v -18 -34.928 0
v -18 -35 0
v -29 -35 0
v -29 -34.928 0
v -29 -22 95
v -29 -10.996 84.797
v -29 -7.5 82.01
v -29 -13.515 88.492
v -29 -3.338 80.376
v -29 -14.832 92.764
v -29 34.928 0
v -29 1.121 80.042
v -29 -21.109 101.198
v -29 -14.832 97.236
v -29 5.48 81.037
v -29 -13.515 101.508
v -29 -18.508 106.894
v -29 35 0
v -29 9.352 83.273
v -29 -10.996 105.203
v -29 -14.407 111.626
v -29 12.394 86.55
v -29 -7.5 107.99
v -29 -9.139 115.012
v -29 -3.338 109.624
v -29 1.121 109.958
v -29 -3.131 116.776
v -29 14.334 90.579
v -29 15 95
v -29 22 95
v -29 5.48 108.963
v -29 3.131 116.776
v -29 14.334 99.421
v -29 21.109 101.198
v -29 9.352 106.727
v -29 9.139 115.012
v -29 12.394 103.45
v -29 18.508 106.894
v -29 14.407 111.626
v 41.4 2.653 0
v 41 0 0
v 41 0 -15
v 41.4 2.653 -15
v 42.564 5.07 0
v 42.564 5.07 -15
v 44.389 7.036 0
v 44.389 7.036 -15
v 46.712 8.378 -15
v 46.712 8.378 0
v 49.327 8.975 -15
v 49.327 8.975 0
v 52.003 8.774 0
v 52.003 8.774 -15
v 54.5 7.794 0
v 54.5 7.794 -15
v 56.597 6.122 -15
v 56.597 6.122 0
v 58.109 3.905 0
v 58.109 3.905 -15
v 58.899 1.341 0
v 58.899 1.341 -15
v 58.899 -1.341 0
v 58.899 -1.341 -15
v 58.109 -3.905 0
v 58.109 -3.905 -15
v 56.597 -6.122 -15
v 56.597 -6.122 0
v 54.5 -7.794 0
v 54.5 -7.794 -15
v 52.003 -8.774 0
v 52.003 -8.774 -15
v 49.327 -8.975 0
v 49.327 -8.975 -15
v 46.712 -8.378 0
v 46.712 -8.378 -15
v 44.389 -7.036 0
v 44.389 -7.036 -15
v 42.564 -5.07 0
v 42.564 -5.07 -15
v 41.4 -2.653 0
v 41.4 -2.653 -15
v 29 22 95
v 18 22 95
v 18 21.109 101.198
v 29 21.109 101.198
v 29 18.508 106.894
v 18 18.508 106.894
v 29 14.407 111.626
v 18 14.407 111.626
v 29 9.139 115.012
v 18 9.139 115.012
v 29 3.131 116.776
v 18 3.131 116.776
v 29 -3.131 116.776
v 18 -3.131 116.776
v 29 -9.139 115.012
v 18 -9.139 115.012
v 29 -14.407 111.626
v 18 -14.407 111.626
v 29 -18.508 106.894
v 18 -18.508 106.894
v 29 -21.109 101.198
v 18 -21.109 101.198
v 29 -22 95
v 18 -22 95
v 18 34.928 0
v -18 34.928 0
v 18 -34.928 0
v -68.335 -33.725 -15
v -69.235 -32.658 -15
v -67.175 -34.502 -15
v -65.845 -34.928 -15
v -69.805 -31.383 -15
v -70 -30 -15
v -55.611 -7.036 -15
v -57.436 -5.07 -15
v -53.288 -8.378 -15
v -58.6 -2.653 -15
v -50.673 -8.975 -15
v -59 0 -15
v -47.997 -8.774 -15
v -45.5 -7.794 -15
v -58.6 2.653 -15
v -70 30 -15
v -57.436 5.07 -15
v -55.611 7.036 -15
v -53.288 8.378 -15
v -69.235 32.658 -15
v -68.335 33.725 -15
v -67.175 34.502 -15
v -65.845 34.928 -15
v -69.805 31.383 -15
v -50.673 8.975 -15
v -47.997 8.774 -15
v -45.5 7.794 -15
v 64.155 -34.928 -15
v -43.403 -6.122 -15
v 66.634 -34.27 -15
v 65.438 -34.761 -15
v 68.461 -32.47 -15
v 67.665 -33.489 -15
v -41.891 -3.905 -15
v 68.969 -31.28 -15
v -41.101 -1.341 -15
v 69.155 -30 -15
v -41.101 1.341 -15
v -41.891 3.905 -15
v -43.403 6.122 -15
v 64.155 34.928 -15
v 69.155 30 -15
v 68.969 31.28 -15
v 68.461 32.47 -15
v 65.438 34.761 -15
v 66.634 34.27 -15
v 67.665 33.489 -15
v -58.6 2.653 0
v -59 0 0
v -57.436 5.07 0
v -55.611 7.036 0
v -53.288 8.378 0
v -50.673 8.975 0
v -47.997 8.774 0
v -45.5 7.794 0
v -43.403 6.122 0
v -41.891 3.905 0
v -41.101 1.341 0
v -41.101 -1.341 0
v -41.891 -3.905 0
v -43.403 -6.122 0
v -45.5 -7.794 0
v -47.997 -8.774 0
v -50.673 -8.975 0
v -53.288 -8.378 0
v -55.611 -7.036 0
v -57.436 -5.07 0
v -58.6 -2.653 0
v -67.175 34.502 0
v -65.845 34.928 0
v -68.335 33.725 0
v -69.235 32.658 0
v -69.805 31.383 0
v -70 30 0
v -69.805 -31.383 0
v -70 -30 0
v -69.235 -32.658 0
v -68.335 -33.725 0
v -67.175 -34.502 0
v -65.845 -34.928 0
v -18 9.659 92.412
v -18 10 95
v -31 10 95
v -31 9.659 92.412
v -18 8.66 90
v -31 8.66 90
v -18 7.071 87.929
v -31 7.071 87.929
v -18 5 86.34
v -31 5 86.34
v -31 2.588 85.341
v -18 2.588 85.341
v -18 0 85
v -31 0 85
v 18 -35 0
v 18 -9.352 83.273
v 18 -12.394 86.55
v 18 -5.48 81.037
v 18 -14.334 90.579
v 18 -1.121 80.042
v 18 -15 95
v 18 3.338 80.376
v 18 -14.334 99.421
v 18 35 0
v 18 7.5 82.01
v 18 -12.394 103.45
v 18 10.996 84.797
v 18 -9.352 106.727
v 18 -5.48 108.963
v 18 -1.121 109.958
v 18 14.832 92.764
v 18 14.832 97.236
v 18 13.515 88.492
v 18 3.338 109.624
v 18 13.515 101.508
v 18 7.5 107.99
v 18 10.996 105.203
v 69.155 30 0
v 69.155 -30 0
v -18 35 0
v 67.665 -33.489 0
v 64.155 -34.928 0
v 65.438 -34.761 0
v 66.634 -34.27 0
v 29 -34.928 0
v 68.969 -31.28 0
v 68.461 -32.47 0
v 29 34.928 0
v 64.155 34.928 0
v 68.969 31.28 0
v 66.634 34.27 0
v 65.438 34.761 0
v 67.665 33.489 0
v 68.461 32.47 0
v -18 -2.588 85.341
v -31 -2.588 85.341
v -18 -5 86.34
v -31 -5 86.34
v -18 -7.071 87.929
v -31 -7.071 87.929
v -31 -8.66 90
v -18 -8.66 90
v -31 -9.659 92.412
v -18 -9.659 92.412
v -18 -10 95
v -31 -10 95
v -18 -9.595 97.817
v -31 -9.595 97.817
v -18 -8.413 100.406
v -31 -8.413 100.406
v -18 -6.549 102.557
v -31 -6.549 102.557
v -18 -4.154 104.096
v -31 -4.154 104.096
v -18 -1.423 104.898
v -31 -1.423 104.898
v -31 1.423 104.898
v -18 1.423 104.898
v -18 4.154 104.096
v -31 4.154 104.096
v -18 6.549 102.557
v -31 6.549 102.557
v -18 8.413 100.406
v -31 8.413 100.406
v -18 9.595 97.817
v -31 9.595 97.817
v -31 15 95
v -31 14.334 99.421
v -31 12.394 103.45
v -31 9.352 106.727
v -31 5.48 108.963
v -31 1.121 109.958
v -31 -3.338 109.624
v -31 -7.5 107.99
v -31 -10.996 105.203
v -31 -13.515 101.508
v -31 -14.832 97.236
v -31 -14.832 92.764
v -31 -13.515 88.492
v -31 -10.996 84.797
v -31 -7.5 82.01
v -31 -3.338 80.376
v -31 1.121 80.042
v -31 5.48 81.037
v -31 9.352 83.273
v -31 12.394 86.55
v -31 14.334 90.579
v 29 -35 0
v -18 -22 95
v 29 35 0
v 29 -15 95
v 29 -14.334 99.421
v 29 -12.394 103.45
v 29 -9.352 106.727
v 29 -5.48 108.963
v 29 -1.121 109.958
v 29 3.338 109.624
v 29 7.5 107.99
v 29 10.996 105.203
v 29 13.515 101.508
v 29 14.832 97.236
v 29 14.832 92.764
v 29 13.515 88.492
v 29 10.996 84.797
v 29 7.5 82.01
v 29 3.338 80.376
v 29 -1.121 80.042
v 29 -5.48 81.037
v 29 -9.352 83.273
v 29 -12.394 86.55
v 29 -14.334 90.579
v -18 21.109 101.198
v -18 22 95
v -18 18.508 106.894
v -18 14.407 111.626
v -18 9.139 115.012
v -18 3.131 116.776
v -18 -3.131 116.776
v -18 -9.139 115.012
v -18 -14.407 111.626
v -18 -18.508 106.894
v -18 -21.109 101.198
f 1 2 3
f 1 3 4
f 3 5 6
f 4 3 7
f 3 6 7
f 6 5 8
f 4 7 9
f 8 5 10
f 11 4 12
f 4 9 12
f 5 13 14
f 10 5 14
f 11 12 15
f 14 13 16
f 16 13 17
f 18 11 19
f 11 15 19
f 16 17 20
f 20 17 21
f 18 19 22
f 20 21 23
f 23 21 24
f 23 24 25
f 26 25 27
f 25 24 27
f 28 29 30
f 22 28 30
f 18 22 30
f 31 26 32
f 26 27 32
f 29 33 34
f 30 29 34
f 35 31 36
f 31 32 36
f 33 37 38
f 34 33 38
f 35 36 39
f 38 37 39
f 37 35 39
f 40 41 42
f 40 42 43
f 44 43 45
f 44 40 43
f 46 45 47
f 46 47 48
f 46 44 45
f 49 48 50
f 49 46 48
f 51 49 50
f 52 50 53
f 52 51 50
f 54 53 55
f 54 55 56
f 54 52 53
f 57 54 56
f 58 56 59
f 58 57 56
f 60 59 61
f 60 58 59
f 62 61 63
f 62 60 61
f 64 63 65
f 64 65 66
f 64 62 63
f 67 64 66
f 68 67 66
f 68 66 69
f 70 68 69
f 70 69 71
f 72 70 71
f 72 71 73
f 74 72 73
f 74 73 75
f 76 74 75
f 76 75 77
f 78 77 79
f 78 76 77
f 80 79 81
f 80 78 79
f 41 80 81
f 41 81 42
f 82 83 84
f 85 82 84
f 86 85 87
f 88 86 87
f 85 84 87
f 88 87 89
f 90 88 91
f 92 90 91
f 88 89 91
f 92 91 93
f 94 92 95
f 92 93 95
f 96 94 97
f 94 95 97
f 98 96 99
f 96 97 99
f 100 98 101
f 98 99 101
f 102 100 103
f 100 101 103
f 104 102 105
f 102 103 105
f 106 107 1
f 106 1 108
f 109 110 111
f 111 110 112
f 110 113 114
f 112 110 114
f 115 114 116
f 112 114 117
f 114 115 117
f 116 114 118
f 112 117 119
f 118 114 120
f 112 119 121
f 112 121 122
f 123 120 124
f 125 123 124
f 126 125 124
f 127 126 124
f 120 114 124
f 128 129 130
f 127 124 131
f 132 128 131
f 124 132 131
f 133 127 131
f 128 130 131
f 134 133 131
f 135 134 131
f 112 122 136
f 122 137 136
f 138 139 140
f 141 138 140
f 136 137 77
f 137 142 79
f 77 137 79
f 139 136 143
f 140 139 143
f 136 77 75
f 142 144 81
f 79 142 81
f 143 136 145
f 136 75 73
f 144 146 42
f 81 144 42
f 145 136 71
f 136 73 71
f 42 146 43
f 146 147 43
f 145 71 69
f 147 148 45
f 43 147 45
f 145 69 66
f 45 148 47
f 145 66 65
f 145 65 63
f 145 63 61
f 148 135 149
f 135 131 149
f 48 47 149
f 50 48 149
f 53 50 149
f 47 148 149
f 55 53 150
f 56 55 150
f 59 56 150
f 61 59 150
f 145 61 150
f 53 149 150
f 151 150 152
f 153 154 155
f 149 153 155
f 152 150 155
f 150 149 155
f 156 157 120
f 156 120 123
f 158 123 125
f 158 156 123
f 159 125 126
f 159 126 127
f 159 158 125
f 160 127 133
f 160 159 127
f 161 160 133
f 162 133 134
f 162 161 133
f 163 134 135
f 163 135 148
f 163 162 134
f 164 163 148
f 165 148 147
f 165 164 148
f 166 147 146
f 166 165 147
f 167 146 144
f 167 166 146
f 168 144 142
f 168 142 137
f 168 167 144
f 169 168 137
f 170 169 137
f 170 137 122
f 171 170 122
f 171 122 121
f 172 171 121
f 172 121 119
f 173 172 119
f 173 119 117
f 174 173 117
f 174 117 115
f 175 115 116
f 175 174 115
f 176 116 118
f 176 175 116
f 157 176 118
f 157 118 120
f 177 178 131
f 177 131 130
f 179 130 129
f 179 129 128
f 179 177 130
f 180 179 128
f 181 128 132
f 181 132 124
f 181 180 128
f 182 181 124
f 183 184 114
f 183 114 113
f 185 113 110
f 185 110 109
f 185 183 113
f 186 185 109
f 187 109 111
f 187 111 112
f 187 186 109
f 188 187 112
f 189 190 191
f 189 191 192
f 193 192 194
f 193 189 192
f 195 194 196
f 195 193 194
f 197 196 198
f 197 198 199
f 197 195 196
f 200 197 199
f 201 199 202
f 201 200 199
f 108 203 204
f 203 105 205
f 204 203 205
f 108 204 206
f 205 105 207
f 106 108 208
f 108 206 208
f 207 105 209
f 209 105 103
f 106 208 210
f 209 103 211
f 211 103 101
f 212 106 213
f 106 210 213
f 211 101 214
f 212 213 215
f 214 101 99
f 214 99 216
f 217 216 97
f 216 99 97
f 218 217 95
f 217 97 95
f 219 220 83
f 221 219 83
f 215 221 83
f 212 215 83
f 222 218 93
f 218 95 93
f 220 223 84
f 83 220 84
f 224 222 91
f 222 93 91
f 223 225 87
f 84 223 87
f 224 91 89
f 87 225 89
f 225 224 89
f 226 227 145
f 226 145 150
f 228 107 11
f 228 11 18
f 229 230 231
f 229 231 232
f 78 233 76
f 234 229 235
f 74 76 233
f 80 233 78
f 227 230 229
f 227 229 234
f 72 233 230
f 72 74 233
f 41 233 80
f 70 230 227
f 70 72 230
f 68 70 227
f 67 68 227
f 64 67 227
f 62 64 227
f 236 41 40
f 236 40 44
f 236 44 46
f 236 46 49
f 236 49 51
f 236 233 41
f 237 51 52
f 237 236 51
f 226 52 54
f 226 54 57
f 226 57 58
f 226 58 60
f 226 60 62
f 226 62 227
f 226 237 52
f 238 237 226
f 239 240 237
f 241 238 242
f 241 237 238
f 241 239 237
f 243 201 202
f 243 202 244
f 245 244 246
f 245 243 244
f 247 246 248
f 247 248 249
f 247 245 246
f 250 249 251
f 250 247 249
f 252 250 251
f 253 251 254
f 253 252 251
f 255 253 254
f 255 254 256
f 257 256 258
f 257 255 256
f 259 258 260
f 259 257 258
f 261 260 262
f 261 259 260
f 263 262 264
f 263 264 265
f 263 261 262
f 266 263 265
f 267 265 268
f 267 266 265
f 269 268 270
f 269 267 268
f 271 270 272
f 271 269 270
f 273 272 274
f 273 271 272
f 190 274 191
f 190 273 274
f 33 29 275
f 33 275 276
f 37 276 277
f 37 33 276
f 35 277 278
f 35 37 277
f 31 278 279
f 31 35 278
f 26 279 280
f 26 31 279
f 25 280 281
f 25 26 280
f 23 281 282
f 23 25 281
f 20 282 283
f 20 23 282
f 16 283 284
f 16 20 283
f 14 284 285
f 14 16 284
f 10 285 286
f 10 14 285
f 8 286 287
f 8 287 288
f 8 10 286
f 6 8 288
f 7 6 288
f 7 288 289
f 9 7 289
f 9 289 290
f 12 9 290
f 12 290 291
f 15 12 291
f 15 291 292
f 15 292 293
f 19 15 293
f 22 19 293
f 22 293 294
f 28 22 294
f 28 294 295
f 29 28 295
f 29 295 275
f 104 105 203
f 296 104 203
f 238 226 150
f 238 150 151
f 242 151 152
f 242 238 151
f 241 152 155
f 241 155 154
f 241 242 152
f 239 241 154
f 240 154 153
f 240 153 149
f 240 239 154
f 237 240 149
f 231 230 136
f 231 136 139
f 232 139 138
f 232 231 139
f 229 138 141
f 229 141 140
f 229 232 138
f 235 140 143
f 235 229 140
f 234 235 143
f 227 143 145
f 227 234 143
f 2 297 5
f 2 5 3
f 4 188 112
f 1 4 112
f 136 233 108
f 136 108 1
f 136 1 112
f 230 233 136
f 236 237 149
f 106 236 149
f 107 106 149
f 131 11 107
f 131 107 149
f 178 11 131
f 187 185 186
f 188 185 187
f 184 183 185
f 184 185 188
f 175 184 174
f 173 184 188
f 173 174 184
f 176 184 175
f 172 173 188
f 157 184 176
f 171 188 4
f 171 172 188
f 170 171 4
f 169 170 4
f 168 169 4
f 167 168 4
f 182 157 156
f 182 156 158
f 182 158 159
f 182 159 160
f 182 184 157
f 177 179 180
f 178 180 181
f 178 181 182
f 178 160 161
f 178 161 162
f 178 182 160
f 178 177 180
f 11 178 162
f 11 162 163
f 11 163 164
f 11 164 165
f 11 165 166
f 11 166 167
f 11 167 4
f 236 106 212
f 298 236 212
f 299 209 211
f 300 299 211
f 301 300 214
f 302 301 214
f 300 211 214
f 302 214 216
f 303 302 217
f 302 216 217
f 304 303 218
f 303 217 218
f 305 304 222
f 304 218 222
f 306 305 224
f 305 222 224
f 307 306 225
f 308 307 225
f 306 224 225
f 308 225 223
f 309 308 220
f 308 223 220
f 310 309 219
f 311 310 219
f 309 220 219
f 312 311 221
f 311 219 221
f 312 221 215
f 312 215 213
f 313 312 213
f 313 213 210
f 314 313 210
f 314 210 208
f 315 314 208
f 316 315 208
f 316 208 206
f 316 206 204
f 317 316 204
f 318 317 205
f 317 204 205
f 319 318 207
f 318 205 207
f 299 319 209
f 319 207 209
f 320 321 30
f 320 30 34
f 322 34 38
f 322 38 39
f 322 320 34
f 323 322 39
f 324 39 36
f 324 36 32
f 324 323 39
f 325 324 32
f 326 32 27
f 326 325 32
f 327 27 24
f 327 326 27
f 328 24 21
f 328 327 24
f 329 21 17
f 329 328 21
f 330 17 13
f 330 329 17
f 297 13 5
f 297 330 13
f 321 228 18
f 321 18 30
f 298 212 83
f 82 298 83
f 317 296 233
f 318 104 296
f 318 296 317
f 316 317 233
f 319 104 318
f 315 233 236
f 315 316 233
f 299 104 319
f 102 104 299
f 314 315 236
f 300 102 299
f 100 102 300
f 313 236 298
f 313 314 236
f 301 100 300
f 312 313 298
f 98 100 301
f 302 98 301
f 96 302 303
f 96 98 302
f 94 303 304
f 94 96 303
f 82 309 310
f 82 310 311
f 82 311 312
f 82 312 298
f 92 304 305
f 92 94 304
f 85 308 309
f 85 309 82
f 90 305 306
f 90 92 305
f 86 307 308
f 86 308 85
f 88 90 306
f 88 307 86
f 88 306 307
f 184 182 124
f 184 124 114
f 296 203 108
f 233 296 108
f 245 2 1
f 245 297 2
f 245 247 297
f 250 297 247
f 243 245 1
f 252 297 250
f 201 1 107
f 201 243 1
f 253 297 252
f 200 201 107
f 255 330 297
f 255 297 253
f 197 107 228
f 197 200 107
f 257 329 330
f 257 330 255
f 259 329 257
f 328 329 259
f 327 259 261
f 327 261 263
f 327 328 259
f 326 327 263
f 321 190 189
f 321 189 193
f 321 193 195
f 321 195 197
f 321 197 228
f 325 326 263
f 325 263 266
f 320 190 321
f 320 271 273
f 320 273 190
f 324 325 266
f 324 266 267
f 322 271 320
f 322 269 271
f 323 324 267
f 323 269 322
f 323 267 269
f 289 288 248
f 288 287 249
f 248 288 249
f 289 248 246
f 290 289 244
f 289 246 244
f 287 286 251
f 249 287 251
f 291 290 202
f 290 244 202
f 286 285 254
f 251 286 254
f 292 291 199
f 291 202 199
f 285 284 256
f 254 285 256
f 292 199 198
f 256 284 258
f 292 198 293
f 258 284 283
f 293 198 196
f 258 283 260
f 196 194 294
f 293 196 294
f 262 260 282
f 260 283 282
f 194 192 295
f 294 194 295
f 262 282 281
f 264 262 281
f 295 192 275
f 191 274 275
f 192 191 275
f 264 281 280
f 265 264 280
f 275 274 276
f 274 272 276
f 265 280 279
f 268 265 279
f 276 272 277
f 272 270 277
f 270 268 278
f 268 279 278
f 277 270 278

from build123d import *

# Parameters (mm, degrees)
F5_DEPTH = 15
F6_DEPTH = 11
F7_DEPTH = 11
F8_DEPTH = 13


# Not quite as in the source:
# - a feature of the source that left no trace in its solid (it failed there, or was rolled back) is left out


with BuildPart() as f5:
    # F0 (on Top) → F5 (new body)
    with BuildSketch(Plane.XY):
        with BuildLine():
            Line((-70, 30), (-70, 0))
            Line((-70, 0), (-70, -30))
            ThreePointArc((-70, -30), (-68.8225510753, -33.2230580629), (-65.8447586893, -34.9281216256))
            Line((-65.8447586893, -34.9281216256), (64.1552413107, -34.9281216256))
            ThreePointArc((64.1552413107, -34.9281216256), (67.6652703796, -33.4889776935), (69.154724634, -30))
            Line((69.154724634, -30), (69.154724634, 0))
            Line((69.154724634, 0), (69.154724634, 30))
            ThreePointArc((69.154724634, 30), (67.6652703796, 33.4889776935), (64.1552413107, 34.9281216256))
            Line((64.1552413107, 34.9281216256), (-65.8447586893, 34.9281216256))
            ThreePointArc((-65.8447586893, 34.9281216256), (-68.8225510753, 33.2230580629), (-70, 30))
        make_face()
        with BuildLine():
            ThreePointArc((-41, 0), (-50, -9), (-59, 0))
            ThreePointArc((-59, 0), (-50, 9), (-41, 0))
        make_face(mode=Mode.SUBTRACT)
        with BuildLine():
            ThreePointArc((59, 0), (50, -9), (41, 0))
            ThreePointArc((41, 0), (50, 9), (59, 0))
        make_face(mode=Mode.SUBTRACT)
    extrude(amount=-F5_DEPTH)

    # F2 (on offset) → F6 (join)
    with BuildSketch(Plane.YZ.offset(-18)):
        with BuildLine():
            Line((-35, 0), (0, 0))
            Line((0, 0), (35, 0))
            Line((35, 0), (22, 95))
            ThreePointArc((22, 95), (0, 117), (-22, 95))
            Line((-22, 95), (-35, 0))
        make_face()
        with BuildLine():
            ThreePointArc((15, 95), (10.6066017178, 84.3933982822), (0, 80))
            ThreePointArc((0, 80), (-10.6066017178, 84.3933982822), (-15, 95))
            ThreePointArc((-15, 95), (0, 110), (15, 95))
        make_face(mode=Mode.SUBTRACT)
    extrude(amount=-F6_DEPTH)

    # F4 (on offset) → F7 (join)
    with BuildSketch(Plane.YZ.offset(18)):
        with BuildLine():
            ThreePointArc((22, 95), (0, 117), (-22, 95))
            Line((-22, 95), (-35, 0))
            Line((-35, 0), (0, 0))
            Line((0, 0), (35, 0))
            Line((35, 0), (22, 95))
        make_face()
        with BuildLine():
            ThreePointArc((15, 95), (10.6066017178, 84.3933982822), (0, 80))
            ThreePointArc((0, 80), (-10.6066017178, 84.3933982822), (-15, 95))
            ThreePointArc((-15, 95), (0, 110), (15, 95))
        make_face(mode=Mode.SUBTRACT)
    extrude(amount=F7_DEPTH)

    # F2 (on offset) → F8 (join)
    with BuildSketch(Plane.YZ.offset(-18)):
        with BuildLine():
            ThreePointArc((-15, 95), (-10.6066017178, 84.3933982822), (0, 80))
            ThreePointArc((0, 80), (10.6066017178, 84.3933982822), (15, 95))
            ThreePointArc((15, 95), (0, 110), (-15, 95))
        make_face()
        with BuildLine():
            ThreePointArc((10, 95), (7.0710678119, 87.9289321881), (0, 85))
            ThreePointArc((0, 85), (-7.0710678119, 87.9289321881), (-10, 95))
            ThreePointArc((-10, 95), (0, 105), (10, 95))
        make_face(mode=Mode.SUBTRACT)
    extrude(amount=-F8_DEPTH)


solid = f5.part
